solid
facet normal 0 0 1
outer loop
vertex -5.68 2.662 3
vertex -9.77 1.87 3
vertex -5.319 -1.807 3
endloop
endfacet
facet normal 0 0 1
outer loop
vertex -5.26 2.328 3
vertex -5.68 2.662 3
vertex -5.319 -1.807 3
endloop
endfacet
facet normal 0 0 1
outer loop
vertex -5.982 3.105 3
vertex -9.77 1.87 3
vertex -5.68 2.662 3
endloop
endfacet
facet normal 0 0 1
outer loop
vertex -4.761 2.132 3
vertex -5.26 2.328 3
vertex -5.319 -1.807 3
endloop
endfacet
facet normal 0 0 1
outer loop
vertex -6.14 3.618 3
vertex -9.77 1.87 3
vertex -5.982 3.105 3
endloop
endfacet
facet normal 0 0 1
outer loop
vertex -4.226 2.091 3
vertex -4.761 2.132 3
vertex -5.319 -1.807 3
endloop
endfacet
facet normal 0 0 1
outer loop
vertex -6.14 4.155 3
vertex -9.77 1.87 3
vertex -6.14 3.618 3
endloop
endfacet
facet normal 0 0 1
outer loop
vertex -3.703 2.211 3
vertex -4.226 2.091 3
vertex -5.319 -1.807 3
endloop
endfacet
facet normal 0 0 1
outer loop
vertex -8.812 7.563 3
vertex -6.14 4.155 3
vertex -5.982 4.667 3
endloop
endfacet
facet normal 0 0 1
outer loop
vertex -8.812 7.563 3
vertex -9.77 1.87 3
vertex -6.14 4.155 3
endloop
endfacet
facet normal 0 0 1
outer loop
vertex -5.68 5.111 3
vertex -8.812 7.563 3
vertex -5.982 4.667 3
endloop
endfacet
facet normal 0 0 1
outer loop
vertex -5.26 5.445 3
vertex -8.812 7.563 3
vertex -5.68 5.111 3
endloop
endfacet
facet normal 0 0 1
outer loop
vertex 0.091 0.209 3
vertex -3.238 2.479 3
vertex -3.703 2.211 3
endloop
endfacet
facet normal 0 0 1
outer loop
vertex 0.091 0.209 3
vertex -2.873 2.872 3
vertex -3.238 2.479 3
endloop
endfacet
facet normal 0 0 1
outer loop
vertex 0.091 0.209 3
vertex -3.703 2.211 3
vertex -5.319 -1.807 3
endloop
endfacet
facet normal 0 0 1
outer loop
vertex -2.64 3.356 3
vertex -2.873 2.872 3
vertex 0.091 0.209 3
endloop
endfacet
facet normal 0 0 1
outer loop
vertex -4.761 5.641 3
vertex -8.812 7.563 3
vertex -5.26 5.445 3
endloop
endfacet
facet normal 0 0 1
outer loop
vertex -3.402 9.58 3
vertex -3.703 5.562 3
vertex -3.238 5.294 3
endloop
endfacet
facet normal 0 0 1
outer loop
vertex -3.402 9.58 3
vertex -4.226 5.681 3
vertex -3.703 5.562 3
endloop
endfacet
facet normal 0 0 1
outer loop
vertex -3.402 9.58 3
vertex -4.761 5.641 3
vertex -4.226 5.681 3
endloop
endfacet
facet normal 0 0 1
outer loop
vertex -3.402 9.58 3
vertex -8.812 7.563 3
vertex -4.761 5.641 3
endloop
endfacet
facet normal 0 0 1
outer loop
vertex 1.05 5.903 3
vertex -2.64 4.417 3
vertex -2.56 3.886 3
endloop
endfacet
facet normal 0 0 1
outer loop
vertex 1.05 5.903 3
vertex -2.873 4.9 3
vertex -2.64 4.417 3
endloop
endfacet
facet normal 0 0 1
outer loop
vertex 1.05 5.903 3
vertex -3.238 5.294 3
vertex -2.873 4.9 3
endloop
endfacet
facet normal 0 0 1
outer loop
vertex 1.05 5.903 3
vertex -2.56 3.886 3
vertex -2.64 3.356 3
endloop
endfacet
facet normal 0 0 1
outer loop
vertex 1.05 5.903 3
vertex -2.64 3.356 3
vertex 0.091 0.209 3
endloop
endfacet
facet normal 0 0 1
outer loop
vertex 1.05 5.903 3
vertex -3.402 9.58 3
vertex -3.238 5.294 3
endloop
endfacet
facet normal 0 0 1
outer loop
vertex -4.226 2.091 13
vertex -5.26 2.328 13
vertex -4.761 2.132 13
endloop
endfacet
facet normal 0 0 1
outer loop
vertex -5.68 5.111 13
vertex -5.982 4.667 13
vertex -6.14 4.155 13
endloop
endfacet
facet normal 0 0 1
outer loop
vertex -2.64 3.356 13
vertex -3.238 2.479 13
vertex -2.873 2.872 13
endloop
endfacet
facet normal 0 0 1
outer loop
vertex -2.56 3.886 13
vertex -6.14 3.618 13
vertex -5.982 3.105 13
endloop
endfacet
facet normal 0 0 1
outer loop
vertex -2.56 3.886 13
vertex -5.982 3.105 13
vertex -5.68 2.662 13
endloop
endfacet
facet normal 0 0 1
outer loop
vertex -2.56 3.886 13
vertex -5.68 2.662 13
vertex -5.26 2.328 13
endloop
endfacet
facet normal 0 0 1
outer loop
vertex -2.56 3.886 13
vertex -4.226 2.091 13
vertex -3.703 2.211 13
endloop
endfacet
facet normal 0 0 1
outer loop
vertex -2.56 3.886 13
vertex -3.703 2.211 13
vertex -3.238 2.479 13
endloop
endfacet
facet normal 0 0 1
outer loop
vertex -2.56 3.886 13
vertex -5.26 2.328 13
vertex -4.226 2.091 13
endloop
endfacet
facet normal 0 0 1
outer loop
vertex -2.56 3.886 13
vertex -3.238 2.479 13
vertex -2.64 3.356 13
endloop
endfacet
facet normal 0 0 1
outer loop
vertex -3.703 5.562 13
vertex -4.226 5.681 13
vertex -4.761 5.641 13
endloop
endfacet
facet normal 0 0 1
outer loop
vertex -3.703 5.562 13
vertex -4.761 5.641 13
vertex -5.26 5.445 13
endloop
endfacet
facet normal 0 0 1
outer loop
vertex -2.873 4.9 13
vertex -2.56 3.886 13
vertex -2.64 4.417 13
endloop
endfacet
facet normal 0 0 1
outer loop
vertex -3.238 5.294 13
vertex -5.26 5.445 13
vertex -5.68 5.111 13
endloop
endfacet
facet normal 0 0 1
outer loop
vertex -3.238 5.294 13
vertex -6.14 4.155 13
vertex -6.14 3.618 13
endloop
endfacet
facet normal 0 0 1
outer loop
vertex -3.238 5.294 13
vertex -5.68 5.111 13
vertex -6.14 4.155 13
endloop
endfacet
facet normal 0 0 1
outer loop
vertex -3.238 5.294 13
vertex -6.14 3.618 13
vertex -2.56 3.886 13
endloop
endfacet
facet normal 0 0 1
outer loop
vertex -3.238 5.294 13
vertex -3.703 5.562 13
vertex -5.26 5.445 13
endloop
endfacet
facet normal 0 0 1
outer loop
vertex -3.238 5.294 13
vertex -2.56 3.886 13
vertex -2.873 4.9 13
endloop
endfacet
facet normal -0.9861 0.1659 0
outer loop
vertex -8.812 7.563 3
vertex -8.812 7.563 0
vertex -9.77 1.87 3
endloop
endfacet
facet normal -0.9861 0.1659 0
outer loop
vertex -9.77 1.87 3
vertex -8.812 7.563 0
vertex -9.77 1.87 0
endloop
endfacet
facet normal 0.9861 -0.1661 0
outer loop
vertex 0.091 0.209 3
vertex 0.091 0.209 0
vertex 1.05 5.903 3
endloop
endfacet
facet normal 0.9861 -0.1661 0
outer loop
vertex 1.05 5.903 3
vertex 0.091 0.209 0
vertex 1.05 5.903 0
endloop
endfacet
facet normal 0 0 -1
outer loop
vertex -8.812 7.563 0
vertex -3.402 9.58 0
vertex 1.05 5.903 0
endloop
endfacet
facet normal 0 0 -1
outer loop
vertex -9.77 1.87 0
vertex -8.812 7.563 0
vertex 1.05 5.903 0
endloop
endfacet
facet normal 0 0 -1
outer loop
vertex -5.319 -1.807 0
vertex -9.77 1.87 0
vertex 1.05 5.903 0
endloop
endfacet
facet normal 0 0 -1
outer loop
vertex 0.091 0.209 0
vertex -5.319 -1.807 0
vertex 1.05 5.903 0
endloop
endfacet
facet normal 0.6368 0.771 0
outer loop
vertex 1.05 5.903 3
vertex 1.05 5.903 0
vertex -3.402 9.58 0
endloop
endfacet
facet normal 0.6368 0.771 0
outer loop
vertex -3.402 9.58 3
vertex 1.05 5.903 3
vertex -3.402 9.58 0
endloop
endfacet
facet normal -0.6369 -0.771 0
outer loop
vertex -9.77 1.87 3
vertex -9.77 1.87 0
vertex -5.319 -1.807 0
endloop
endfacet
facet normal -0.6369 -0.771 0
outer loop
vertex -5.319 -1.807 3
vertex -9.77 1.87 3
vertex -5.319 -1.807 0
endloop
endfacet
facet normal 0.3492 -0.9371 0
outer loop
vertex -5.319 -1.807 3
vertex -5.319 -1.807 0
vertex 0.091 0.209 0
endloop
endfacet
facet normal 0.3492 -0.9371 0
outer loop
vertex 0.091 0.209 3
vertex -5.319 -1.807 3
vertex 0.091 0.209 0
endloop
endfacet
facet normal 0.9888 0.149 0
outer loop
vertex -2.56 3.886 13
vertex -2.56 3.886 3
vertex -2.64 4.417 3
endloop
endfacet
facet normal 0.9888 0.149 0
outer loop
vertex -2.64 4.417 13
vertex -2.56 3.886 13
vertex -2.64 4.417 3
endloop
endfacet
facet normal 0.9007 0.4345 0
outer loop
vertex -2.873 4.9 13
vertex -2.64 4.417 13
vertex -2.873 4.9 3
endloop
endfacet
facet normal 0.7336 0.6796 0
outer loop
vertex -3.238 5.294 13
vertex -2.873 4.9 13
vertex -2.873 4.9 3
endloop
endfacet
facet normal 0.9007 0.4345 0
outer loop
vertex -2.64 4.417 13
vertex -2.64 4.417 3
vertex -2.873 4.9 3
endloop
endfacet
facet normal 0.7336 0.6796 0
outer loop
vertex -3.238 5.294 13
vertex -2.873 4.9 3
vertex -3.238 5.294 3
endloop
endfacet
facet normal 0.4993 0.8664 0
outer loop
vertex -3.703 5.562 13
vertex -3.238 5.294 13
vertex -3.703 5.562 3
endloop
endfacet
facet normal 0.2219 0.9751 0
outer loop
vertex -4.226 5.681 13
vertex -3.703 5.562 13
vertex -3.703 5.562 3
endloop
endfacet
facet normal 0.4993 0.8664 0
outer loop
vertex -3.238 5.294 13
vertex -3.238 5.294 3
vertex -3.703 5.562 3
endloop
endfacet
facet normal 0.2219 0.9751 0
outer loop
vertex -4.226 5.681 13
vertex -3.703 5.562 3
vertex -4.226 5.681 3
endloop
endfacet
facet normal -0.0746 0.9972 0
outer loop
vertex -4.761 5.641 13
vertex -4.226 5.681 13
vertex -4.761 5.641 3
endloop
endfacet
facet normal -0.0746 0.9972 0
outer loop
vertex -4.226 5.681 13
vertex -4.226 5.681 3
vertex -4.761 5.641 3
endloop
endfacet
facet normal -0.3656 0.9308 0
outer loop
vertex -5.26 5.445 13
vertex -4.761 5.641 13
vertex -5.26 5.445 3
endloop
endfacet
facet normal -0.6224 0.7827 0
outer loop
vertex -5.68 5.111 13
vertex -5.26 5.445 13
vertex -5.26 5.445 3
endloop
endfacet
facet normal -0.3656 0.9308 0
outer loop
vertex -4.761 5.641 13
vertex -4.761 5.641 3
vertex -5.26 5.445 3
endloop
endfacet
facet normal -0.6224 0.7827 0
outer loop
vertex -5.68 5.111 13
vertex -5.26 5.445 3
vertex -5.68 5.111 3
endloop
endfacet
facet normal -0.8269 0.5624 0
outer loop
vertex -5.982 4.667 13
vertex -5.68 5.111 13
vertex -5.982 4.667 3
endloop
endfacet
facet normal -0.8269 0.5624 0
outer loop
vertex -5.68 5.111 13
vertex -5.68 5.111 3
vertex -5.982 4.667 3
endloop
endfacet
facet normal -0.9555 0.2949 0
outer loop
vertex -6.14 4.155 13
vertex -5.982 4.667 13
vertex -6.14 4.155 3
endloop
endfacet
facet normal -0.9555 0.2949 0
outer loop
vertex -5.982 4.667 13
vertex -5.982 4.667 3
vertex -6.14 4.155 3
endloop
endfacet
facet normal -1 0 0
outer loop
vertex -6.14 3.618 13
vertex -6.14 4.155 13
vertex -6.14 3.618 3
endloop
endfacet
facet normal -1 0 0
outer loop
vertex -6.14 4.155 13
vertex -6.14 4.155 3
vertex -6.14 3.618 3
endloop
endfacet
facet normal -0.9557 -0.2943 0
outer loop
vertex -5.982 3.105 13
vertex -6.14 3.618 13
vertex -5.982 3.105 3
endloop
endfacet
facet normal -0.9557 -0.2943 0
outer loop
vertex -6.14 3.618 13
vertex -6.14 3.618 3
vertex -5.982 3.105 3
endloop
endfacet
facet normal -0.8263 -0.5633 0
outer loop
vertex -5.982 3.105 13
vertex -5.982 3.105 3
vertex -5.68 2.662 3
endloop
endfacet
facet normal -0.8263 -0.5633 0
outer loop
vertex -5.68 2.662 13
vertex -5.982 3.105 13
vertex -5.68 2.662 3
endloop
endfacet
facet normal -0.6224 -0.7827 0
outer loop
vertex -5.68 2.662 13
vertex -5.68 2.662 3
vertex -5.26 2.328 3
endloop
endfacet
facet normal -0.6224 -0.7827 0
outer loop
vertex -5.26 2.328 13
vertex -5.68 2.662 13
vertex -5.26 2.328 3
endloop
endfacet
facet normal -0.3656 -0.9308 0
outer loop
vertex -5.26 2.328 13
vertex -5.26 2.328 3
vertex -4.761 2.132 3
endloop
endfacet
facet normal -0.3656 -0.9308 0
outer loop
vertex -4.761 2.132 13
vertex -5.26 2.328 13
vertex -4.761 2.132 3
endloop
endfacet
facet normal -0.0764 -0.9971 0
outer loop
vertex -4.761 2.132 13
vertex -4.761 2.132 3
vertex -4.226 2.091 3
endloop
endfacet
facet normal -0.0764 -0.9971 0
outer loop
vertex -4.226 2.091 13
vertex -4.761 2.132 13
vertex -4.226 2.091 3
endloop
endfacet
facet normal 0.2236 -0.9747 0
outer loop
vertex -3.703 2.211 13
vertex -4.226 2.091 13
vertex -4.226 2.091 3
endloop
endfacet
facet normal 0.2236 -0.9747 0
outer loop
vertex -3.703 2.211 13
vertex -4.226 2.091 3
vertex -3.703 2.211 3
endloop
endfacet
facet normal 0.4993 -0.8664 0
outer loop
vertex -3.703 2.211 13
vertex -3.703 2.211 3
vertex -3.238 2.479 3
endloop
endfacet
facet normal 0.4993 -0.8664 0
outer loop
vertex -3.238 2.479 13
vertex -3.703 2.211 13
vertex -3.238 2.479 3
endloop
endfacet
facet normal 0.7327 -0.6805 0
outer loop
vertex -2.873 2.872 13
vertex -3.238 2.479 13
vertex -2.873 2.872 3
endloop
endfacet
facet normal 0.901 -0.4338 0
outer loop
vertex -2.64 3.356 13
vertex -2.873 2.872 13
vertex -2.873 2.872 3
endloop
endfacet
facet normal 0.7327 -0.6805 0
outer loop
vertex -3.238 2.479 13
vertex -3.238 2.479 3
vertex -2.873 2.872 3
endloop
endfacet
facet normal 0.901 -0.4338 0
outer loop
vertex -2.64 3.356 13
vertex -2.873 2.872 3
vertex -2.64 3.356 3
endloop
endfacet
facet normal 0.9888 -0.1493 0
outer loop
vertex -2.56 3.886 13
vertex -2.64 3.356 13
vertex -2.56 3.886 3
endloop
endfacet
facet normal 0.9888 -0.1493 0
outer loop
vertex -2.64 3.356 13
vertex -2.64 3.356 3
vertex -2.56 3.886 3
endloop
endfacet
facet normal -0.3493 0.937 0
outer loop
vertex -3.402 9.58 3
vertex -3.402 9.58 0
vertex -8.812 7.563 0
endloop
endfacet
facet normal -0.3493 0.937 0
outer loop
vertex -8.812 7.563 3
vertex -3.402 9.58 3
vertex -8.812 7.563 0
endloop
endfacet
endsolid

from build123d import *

# Parameters (mm, degrees)
BOSS_EXTRU_1_DEPTH = 3
ESQUISSE2_R        = 1.8
BOSS_EXTRU_2_DEPTH = 10


with BuildPart() as part:
    # Esquisse1 → Boss.-Extru.1 (new body)
    with BuildSketch(Plane.XY):
        Polygon((0.090746241, 0.209409856), (1.049578601, 5.902736989), (-3.401571147, 9.579773737), (-8.811553256, 7.563483353), (-9.770385617, 1.870156221), (-5.319235869, -1.806880528), align=None)
    extrude(amount=BOSS_EXTRU_1_DEPTH)

    # Esquisse2 → Boss.-Extru.2 (add)
    with BuildSketch(Plane.XY.offset(3)):
        with Locations((-4.360403508, 3.886446605)):
            Circle(ESQUISSE2_R)
    extrude(amount=BOSS_EXTRU_2_DEPTH)


solid = part.part
